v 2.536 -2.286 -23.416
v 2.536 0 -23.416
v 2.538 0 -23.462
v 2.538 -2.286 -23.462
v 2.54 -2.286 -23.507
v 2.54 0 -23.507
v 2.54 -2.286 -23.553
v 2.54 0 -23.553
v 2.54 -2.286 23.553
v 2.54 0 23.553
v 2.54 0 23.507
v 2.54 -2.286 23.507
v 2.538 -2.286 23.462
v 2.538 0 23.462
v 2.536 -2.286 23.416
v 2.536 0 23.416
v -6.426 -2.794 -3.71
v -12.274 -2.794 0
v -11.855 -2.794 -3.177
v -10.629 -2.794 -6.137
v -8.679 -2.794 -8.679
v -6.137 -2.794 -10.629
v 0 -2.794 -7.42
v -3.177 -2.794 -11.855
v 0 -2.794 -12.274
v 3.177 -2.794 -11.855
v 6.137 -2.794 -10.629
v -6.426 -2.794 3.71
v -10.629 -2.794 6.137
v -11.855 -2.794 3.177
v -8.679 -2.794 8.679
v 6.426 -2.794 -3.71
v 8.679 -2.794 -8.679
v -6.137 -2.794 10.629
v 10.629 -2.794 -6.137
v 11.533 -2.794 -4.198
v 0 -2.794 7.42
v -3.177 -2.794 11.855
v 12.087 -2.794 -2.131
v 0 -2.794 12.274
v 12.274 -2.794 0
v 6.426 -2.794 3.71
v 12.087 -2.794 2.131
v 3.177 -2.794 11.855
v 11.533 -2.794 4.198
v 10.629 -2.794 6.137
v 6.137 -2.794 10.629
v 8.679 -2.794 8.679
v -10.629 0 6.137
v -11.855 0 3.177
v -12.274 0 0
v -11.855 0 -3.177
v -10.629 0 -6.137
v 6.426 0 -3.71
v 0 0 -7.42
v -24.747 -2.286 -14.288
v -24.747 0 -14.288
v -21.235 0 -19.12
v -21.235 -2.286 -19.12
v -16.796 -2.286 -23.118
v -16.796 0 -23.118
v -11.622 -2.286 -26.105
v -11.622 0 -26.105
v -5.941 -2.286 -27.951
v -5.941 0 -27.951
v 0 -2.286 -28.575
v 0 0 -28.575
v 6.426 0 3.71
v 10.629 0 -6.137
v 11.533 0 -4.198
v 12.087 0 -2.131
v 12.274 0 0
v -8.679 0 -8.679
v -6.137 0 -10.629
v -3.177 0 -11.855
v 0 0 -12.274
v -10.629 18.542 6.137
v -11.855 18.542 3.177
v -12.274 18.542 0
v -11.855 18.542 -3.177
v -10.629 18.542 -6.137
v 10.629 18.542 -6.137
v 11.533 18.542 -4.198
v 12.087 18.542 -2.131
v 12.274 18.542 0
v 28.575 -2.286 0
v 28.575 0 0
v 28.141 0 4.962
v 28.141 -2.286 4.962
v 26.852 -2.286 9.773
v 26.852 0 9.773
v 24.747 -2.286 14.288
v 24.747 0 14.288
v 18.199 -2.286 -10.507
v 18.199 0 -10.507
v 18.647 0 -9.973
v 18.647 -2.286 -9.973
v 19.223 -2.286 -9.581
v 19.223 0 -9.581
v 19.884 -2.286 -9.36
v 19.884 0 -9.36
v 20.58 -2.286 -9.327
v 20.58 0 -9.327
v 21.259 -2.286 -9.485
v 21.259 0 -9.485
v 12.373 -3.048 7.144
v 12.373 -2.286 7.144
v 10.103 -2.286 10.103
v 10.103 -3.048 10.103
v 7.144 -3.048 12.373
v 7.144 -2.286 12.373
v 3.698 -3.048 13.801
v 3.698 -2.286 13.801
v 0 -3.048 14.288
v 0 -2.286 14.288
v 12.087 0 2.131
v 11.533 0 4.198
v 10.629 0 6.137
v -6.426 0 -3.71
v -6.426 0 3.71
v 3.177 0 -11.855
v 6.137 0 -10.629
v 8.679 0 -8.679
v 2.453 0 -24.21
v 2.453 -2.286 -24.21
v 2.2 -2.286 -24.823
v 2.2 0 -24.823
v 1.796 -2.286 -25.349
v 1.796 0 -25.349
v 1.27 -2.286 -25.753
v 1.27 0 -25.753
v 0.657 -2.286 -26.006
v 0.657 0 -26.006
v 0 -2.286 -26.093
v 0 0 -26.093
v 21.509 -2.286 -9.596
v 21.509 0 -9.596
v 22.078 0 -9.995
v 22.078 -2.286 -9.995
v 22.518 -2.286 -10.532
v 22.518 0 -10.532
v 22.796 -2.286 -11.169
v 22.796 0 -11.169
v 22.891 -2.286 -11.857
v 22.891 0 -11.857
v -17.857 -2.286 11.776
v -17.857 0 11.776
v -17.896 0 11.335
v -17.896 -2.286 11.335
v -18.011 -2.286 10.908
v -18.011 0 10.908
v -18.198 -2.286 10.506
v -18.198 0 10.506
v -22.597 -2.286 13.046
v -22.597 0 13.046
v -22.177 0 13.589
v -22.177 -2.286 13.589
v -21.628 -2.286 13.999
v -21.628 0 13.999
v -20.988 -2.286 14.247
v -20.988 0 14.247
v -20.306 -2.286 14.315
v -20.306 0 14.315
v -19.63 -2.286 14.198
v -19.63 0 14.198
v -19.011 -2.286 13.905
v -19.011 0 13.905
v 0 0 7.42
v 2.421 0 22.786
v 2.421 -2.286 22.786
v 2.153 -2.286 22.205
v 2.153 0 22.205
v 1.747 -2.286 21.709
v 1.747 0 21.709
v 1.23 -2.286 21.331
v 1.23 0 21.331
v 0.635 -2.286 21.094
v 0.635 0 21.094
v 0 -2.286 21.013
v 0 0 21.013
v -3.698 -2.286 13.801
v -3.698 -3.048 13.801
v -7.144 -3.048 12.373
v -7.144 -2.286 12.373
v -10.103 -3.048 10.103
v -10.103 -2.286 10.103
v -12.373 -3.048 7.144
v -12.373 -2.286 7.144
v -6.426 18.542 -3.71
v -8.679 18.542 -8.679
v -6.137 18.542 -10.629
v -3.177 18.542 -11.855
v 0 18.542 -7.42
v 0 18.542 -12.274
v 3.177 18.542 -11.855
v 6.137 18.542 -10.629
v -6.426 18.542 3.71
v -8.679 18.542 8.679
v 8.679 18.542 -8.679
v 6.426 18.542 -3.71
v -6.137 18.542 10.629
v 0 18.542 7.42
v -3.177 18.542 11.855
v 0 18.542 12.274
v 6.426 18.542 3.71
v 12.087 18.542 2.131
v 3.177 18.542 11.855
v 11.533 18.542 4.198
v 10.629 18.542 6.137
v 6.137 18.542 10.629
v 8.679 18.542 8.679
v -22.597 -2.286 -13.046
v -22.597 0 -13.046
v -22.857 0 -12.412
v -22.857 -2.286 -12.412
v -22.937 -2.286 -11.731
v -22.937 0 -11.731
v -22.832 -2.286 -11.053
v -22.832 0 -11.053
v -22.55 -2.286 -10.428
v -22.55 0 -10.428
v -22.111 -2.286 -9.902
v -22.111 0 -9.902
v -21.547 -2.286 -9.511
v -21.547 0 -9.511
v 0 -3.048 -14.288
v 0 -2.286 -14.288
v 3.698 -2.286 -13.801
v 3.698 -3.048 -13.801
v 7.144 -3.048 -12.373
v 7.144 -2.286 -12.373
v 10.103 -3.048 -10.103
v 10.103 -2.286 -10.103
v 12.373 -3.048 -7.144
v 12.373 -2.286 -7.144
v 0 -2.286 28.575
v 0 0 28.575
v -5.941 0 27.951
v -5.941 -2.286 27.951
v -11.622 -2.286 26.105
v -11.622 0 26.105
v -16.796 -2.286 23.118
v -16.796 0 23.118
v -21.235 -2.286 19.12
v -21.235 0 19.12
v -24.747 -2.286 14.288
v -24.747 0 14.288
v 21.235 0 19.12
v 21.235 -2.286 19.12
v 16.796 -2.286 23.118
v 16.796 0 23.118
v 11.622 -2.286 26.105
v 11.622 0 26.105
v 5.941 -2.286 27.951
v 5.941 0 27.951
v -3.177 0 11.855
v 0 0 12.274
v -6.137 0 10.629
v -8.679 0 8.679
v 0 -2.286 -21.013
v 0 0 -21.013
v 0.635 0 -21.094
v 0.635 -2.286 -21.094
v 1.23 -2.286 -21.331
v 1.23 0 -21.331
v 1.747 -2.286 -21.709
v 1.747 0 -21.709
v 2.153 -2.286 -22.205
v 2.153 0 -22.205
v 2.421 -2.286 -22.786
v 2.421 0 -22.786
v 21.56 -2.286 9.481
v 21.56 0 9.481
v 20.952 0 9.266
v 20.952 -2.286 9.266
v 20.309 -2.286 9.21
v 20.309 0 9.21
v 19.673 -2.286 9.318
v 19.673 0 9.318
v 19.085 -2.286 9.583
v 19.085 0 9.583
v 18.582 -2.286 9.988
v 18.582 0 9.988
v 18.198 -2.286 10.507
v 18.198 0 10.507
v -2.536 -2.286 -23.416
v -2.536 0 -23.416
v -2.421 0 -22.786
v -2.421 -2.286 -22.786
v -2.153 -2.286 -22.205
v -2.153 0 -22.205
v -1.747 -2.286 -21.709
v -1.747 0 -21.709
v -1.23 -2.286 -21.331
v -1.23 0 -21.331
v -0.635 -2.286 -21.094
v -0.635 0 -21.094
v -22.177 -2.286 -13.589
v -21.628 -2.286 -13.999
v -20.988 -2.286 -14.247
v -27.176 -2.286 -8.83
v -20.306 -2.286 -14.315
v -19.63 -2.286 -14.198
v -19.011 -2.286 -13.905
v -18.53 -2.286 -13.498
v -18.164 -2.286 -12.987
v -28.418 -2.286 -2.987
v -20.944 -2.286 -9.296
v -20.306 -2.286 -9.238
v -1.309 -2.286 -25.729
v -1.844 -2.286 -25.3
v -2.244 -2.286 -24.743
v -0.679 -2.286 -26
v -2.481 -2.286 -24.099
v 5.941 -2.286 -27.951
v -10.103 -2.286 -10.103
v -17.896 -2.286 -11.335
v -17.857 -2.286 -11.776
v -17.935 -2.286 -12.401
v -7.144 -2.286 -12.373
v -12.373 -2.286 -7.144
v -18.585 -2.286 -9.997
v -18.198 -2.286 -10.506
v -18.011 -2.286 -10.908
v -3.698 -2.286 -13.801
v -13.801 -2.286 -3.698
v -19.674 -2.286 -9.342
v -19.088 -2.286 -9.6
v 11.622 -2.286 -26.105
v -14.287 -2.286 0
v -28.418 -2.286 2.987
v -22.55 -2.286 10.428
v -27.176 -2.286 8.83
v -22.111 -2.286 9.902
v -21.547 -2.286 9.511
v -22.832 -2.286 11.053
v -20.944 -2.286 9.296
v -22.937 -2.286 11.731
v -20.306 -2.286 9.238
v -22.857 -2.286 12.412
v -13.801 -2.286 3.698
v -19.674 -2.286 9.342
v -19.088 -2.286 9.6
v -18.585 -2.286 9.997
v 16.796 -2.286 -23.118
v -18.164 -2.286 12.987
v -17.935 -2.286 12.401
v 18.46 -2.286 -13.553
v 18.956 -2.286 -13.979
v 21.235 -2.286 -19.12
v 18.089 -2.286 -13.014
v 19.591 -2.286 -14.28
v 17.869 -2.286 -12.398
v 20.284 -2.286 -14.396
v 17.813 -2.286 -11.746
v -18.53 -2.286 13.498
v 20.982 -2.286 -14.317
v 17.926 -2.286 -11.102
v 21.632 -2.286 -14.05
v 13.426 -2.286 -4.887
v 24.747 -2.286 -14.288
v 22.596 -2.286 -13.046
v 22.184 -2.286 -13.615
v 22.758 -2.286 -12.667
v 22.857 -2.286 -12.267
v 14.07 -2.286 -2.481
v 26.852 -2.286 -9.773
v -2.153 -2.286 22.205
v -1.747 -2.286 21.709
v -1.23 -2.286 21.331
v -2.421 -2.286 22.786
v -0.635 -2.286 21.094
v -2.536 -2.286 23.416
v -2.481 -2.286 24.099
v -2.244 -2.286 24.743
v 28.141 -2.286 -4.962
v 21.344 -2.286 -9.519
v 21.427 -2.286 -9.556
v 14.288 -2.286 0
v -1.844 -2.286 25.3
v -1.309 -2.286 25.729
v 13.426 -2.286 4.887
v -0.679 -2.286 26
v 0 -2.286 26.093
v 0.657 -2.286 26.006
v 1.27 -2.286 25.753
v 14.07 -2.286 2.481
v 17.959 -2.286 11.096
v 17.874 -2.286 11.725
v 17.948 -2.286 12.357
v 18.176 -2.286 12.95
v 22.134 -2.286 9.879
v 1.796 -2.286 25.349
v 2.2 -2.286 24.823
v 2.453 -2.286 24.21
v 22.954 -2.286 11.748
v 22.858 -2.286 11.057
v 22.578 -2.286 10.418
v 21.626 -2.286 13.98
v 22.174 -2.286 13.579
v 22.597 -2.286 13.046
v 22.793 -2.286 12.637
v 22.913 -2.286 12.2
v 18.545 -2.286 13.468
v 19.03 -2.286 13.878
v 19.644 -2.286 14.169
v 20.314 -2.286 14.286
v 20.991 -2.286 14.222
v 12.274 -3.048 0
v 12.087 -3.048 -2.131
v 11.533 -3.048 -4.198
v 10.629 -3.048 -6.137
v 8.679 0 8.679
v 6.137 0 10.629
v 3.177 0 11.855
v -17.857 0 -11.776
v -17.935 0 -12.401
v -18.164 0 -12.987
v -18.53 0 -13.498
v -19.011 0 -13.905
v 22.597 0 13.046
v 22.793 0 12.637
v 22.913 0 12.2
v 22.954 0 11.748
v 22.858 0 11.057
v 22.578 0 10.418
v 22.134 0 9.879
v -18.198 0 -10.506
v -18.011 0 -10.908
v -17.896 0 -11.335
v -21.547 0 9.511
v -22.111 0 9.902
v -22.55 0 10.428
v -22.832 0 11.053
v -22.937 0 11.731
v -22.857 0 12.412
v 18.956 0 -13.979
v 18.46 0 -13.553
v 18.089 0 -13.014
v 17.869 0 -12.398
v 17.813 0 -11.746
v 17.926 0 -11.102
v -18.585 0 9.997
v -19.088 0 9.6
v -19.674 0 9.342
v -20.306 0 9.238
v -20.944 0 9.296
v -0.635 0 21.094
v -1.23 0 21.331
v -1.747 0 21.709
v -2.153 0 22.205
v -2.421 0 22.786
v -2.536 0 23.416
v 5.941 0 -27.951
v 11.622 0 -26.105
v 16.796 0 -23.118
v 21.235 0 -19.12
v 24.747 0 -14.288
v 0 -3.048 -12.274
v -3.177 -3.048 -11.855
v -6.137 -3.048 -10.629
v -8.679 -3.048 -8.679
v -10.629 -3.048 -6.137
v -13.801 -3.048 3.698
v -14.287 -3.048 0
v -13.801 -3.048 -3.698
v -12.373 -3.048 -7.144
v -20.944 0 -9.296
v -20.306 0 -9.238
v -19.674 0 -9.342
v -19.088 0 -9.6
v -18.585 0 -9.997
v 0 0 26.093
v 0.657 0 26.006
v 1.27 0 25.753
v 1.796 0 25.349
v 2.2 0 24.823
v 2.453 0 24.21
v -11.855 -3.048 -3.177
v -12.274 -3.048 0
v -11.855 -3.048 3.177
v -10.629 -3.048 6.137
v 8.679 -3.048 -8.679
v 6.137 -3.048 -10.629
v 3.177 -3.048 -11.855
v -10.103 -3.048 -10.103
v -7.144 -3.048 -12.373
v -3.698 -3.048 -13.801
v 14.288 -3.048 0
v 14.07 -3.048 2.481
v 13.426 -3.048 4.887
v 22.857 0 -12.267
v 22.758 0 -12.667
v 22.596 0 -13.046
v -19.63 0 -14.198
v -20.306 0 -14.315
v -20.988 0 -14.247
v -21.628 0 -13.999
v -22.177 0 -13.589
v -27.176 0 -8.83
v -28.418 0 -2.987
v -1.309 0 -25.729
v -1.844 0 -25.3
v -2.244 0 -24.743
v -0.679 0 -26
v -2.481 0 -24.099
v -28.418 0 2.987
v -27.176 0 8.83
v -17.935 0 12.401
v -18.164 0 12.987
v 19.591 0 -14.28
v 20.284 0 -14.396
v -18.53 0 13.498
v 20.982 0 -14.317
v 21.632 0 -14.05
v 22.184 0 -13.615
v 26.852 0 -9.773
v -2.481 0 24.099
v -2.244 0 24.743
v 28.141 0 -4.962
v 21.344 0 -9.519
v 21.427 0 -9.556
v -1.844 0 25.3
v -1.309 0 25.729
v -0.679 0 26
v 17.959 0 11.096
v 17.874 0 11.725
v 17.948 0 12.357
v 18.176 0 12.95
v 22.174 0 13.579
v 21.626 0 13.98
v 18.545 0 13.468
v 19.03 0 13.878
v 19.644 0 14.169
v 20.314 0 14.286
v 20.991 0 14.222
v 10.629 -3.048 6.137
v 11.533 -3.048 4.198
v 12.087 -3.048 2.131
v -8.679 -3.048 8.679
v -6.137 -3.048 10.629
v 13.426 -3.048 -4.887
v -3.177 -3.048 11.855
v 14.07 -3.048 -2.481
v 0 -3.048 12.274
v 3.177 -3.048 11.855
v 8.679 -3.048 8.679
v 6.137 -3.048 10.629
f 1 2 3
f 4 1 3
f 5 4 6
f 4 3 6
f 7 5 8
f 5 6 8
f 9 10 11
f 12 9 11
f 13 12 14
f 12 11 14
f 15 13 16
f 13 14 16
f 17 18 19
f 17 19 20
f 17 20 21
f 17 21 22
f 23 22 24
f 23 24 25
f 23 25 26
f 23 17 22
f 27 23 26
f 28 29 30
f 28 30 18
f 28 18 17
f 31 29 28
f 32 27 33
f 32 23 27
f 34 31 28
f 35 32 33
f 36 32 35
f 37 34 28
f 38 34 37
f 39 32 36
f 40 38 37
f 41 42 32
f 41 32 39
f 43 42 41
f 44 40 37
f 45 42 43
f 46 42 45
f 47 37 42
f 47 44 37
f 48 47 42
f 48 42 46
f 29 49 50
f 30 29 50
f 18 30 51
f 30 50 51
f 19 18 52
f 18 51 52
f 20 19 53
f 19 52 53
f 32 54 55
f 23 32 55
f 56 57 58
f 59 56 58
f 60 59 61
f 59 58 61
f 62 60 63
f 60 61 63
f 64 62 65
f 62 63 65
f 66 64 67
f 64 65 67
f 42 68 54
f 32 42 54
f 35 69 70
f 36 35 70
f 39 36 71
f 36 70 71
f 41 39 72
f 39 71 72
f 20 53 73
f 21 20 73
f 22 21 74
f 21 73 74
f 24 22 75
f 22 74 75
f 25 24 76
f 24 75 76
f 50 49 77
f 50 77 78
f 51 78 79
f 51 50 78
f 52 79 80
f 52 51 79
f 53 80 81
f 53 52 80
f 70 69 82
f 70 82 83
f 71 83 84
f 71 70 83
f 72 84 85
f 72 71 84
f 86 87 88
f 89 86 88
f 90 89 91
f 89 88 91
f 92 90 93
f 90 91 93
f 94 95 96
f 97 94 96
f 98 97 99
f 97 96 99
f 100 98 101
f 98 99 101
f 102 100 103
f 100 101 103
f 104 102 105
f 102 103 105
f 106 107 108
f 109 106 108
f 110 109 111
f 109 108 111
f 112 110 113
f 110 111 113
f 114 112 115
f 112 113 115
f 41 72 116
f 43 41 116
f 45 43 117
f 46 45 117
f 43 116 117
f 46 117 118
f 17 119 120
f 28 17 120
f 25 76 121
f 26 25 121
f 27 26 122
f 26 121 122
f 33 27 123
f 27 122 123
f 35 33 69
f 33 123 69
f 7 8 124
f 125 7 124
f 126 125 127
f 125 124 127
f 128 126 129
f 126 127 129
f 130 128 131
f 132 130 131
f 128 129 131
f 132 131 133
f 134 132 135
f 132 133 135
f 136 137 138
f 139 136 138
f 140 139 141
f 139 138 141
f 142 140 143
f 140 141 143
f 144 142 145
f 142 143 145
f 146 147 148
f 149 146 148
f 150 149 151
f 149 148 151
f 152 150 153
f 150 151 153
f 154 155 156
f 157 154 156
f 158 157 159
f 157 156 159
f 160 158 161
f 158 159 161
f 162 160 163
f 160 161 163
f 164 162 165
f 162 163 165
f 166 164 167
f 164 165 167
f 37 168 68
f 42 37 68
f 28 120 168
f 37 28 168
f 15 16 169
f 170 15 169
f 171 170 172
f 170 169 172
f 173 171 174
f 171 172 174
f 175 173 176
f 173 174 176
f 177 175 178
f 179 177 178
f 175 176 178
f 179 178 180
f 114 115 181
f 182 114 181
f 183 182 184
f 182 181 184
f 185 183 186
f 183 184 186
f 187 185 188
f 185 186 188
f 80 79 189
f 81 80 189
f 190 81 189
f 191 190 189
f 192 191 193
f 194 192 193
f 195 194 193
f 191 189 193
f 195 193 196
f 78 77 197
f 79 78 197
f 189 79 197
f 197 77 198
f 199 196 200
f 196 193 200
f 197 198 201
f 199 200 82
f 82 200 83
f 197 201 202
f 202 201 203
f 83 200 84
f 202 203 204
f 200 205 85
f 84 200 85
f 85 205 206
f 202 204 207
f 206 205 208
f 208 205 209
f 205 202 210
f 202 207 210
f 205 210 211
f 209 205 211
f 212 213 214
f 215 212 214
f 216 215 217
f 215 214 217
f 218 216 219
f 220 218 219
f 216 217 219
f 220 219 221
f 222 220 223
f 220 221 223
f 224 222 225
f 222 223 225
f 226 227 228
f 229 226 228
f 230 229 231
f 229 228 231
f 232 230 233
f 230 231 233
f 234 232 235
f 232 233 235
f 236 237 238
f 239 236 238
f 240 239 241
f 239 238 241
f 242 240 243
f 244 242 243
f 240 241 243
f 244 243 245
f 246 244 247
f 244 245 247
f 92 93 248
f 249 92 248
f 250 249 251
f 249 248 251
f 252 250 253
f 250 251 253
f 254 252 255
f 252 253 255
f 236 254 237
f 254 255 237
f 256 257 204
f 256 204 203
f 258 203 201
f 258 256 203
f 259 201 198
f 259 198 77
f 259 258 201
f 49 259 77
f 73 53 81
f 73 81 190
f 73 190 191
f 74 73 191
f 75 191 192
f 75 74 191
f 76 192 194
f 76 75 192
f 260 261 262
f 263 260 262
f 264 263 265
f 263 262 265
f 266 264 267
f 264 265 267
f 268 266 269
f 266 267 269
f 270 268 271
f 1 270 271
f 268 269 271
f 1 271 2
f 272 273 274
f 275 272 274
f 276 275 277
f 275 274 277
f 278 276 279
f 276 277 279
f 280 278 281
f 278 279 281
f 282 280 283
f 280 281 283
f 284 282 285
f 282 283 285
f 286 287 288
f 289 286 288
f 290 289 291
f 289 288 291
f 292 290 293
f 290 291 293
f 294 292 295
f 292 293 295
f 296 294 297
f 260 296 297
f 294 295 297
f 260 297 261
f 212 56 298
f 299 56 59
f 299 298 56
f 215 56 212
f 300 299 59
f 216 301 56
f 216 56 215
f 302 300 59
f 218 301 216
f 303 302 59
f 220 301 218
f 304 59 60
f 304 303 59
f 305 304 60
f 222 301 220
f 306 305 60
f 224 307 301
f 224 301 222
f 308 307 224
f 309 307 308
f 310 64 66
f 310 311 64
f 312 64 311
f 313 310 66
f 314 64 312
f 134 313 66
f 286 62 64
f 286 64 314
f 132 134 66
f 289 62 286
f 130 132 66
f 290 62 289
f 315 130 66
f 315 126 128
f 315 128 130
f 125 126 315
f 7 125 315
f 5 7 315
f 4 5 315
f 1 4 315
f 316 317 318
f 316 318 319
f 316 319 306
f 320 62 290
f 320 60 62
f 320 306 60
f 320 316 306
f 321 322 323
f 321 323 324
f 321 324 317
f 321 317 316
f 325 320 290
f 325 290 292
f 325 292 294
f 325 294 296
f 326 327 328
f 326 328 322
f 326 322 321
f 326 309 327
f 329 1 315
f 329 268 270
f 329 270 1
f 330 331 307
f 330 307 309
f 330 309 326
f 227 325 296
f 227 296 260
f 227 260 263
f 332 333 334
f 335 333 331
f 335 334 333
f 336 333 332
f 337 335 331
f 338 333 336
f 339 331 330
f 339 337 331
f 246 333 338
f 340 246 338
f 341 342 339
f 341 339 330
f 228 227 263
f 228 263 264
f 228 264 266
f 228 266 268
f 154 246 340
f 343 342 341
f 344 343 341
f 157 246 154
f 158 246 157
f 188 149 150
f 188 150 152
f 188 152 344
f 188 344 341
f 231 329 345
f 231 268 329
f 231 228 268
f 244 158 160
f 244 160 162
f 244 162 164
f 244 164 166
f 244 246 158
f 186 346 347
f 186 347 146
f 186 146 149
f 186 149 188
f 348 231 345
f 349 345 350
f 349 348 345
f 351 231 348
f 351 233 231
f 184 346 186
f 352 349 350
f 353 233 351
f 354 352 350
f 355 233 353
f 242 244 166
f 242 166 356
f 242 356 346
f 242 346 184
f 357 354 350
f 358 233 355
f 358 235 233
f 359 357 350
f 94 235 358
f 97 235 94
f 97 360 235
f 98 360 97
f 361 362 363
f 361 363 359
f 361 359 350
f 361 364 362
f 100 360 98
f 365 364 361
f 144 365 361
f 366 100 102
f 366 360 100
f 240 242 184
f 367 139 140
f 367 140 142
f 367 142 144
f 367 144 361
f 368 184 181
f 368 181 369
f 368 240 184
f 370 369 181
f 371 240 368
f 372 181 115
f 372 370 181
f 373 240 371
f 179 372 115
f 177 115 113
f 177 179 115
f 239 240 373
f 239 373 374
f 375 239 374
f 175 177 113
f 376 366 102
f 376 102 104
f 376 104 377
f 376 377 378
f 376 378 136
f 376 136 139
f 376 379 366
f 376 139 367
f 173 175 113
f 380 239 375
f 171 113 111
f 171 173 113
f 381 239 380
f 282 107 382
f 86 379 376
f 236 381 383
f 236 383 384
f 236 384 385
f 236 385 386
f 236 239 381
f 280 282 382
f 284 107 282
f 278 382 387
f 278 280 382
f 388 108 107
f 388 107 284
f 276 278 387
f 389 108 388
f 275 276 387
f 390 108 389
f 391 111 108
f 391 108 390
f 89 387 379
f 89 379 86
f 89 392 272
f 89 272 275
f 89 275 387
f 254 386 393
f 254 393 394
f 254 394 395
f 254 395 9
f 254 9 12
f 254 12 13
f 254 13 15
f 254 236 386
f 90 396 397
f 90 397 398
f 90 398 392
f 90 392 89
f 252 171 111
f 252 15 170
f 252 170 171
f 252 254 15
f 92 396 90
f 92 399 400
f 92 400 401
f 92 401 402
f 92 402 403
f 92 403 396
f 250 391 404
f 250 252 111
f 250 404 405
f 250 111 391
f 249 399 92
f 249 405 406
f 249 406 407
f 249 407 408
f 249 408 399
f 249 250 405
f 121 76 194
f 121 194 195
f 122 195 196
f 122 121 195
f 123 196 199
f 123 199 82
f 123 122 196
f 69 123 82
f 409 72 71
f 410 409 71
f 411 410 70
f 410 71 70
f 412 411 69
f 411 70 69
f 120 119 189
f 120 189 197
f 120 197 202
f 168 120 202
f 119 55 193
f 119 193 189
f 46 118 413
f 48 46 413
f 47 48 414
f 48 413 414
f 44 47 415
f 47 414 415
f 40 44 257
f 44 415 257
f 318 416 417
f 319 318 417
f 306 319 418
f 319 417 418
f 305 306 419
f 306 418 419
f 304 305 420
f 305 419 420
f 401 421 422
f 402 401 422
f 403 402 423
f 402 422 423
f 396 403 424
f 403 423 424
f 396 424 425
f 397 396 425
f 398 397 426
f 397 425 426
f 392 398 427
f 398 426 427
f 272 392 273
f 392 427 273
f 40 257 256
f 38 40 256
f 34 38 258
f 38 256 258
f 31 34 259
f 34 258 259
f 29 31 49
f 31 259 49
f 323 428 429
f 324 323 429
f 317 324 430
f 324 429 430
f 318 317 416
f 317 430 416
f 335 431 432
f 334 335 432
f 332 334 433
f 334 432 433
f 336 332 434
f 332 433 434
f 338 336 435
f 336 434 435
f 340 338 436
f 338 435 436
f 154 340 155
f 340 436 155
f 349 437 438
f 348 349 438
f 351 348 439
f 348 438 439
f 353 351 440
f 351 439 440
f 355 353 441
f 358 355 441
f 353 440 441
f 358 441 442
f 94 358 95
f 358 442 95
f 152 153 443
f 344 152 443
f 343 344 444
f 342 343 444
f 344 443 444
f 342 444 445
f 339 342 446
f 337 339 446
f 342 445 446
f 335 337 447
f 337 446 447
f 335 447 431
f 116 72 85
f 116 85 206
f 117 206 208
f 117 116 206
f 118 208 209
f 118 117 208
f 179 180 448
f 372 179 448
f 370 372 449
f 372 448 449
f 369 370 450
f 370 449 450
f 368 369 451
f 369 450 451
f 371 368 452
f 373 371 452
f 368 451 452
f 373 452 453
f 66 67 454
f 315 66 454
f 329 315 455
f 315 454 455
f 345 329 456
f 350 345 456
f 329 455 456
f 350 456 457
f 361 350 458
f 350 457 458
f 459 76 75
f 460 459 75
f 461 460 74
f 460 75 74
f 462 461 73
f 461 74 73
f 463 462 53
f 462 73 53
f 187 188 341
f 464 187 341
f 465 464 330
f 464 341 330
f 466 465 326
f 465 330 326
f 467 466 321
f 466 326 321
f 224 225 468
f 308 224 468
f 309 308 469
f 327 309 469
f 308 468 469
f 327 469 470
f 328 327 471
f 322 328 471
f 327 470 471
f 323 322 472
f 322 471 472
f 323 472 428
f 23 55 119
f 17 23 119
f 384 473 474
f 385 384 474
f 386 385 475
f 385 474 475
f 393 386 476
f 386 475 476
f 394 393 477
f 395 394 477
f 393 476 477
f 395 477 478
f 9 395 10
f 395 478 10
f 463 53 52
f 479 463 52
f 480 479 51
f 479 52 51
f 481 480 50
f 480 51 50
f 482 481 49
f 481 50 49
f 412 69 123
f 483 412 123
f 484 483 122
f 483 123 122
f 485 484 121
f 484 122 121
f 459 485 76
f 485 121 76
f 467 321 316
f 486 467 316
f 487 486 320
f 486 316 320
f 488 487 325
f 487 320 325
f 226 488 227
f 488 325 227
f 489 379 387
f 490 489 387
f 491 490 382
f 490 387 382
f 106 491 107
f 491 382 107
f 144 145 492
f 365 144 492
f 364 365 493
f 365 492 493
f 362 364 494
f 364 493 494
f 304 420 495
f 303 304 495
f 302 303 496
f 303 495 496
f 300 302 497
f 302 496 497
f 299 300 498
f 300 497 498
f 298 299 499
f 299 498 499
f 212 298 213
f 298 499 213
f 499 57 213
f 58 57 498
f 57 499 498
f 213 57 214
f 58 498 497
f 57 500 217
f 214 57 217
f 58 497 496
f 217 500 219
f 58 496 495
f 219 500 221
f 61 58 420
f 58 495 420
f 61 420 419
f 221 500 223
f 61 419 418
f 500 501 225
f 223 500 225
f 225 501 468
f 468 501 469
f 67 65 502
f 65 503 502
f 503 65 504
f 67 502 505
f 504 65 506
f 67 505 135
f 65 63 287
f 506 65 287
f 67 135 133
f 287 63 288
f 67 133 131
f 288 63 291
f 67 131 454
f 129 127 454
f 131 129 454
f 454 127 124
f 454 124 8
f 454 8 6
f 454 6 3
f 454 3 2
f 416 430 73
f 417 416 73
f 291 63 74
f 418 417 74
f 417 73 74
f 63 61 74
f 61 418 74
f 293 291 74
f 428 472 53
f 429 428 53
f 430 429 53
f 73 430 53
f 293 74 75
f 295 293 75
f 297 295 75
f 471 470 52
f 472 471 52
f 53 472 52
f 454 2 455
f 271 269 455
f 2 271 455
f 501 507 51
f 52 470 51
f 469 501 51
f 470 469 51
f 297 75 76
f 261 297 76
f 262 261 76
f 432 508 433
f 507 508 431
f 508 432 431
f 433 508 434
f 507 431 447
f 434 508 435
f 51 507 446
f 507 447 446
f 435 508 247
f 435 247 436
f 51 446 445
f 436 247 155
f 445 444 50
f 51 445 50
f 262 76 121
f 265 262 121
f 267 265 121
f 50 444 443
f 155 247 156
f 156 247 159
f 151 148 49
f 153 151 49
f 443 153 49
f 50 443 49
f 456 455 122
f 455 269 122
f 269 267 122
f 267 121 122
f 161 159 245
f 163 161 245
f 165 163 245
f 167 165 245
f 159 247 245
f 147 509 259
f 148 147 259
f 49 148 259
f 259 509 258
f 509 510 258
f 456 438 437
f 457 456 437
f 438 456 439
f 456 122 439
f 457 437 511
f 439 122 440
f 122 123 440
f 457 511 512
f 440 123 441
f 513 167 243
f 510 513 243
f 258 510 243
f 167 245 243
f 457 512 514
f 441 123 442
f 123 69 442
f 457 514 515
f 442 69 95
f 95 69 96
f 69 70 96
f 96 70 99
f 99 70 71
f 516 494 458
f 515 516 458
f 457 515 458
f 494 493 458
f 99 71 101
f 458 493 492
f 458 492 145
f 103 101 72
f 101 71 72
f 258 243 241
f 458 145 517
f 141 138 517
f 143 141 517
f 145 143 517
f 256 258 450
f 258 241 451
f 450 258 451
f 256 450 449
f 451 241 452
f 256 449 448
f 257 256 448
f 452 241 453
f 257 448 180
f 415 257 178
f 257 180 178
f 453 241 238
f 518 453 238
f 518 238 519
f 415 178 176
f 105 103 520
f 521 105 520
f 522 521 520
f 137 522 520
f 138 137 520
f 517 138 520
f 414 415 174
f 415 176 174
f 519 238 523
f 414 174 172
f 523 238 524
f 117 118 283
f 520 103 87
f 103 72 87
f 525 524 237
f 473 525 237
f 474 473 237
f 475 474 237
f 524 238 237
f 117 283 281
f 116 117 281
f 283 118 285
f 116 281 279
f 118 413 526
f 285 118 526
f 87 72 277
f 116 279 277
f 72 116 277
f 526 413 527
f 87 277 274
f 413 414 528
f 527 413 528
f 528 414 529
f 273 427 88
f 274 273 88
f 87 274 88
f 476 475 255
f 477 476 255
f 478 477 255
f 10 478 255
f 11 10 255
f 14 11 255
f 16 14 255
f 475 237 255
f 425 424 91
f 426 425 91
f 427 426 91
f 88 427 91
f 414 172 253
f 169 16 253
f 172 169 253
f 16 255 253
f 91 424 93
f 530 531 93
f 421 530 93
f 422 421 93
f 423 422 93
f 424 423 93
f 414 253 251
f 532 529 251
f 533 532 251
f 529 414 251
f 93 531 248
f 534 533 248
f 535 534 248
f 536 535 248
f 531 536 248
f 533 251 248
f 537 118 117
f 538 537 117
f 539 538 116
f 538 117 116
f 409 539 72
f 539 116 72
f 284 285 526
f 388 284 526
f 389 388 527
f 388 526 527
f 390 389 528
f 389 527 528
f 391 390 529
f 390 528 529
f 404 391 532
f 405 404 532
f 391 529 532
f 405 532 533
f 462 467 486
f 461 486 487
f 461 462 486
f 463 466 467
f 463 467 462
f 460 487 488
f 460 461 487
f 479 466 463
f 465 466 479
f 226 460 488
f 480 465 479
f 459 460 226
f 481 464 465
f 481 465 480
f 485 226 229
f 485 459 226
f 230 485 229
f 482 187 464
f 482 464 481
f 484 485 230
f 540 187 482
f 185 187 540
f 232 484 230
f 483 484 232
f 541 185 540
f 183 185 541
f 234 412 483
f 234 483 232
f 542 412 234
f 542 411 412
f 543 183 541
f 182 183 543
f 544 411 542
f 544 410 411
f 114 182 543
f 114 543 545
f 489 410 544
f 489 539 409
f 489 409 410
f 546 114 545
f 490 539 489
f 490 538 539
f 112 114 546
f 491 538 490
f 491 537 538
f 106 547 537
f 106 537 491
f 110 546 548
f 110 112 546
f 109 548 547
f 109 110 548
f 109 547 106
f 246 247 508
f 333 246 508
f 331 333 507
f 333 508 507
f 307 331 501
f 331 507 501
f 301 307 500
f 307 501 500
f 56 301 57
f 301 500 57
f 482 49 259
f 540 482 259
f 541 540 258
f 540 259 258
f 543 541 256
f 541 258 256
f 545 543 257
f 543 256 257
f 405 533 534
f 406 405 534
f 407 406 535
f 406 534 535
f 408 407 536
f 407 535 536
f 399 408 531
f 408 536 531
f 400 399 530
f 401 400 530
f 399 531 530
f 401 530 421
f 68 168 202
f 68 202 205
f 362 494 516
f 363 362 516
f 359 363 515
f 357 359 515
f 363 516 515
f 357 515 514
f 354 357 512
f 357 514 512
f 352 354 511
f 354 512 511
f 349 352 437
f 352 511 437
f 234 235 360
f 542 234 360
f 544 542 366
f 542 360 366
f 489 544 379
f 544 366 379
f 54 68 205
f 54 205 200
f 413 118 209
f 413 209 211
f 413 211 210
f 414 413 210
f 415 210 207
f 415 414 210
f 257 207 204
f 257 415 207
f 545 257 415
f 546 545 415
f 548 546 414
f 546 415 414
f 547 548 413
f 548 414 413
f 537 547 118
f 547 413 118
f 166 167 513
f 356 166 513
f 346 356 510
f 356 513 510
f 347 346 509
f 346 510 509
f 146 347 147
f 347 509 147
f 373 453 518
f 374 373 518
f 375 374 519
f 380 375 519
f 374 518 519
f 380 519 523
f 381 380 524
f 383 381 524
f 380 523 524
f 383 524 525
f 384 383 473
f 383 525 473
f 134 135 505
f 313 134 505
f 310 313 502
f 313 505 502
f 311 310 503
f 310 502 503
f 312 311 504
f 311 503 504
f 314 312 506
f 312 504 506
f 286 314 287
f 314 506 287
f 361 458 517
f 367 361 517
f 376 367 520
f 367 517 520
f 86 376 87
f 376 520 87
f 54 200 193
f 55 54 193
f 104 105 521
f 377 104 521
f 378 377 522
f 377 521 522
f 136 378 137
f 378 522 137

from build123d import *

# Parameters (mm, degrees)
F1_DEPTH = 18.542
F2_DEPTH = 3.048
F3_DEPTH = 2.286
F4_DEPTH = 2.286
F6_DEPTH = 2.794


# Not quite as in the source:
# - a feature of the source that left no trace in its solid (it failed there, or was rolled back) is left out


with BuildPart() as f1:
    # F0 (on Front) → F1 (new body)
    with BuildSketch(Plane.XZ):
        with BuildLine():
            Line((6.4262, 3.7101682999), (10.6292995539, 6.1368289587))
            ThreePointArc((10.6292995539, 6.1368289587), (6.1368289587, 10.6292995539), (0, 12.2736579174))
            Line((0, 12.2736579174), (0, 7.4203365997))
            Line((0, 7.4203365997), (6.4262, 3.7101682999))
        make_face()
        with BuildLine():
            ThreePointArc((12.2736579174, 0), (11.8554431655, 3.1766564221), (10.6292995539, 6.1368289587))
            Line((10.6292995539, 6.1368289587), (6.4262, 3.7101682999))
            Line((6.4262, 3.7101682999), (6.4262, -2.8670745859))
            Line((6.4262, -2.8670745859), (6.4262, -3.7101682999))
            Line((6.4262, -3.7101682999), (10.6292995539, -6.1368289587))
            ThreePointArc((10.6292995539, -6.1368289587), (11.8554431655, -3.1766564221), (12.2736579174, 0))
        make_face()
        with BuildLine():
            ThreePointArc((0, -12.2736579174), (6.1368289587, -10.6292995539), (10.6292995539, -6.1368289587))
            Line((10.6292995539, -6.1368289587), (6.4262, -3.7101682999))
            Line((6.4262, -3.7101682999), (0, -7.4203365997))
            Line((0, -7.4203365997), (0, -12.2736579174))
        make_face()
        with BuildLine():
            Line((0, 7.4203365997), (0, 12.2736579174))
            ThreePointArc((0, 12.2736579174), (-6.1368289587, 10.6292995539), (-10.6292995539, 6.1368289587))
            Line((-10.6292995539, 6.1368289587), (-6.4262, 3.7101682999))
            Line((-6.4262, 3.7101682999), (0, 7.4203365997))
        make_face()
        with BuildLine():
            ThreePointArc((-10.6292995539, -6.1368289587), (-6.1368289587, -10.6292995539), (0, -12.2736579174))
            Line((0, -12.2736579174), (0, -7.4203365997))
            Line((0, -7.4203365997), (-6.4262, -3.7101682999))
            Line((-6.4262, -3.7101682999), (-10.6292995539, -6.1368289587))
        make_face()
        with BuildLine():
            Line((-6.4262, 3.7101682999), (-10.6292995539, 6.1368289587))
            ThreePointArc((-10.6292995539, 6.1368289587), (-12.2736579174, 0), (-10.6292995539, -6.1368289587))
            Line((-10.6292995539, -6.1368289587), (-6.4262, -3.7101682999))
            Line((-6.4262, -3.7101682999), (-6.4262, 3.7101682999))
        make_face()
    extrude(amount=-F1_DEPTH)

    # F0 (on Front) → F6 (join)
    with BuildSketch(Plane.XZ):
        with BuildLine():
            Line((6.4262, 3.7101682999), (10.6292995539, 6.1368289587))
            ThreePointArc((10.6292995539, 6.1368289587), (6.1368289587, 10.6292995539), (0, 12.2736579174))
            Line((0, 12.2736579174), (0, 7.4203365997))
            Line((0, 7.4203365997), (6.4262, 3.7101682999))
        make_face()
        with BuildLine():
            ThreePointArc((12.2736579174, 0), (11.8554431655, 3.1766564221), (10.6292995539, 6.1368289587))
            Line((10.6292995539, 6.1368289587), (6.4262, 3.7101682999))
            Line((6.4262, 3.7101682999), (6.4262, -2.8670745859))
            Line((6.4262, -2.8670745859), (6.4262, -3.7101682999))
            Line((6.4262, -3.7101682999), (10.6292995539, -6.1368289587))
            ThreePointArc((10.6292995539, -6.1368289587), (11.8554431655, -3.1766564221), (12.2736579174, 0))
        make_face()
        with BuildLine():
            ThreePointArc((0, -12.2736579174), (6.1368289587, -10.6292995539), (10.6292995539, -6.1368289587))
            Line((10.6292995539, -6.1368289587), (6.4262, -3.7101682999))
            Line((6.4262, -3.7101682999), (0, -7.4203365997))
            Line((0, -7.4203365997), (0, -12.2736579174))
        make_face()
        with BuildLine():
            Line((0, 7.4203365997), (0, 12.2736579174))
            ThreePointArc((0, 12.2736579174), (-6.1368289587, 10.6292995539), (-10.6292995539, 6.1368289587))
            Line((-10.6292995539, 6.1368289587), (-6.4262, 3.7101682999))
            Line((-6.4262, 3.7101682999), (0, 7.4203365997))
        make_face()
        with BuildLine():
            ThreePointArc((-10.6292995539, -6.1368289587), (-6.1368289587, -10.6292995539), (0, -12.2736579174))
            Line((0, -12.2736579174), (0, -7.4203365997))
            Line((0, -7.4203365997), (-6.4262, -3.7101682999))
            Line((-6.4262, -3.7101682999), (-10.6292995539, -6.1368289587))
        make_face()
        with BuildLine():
            Line((-6.4262, 3.7101682999), (-10.6292995539, 6.1368289587))
            ThreePointArc((-10.6292995539, 6.1368289587), (-12.2736579174, 0), (-10.6292995539, -6.1368289587))
            Line((-10.6292995539, -6.1368289587), (-6.4262, -3.7101682999))
            Line((-6.4262, -3.7101682999), (-6.4262, 3.7101682999))
        make_face()
    extrude(amount=F6_DEPTH)


with BuildPart() as f2:
    # F0 (on Front) → F2 (new body)
    with BuildSketch(Plane.XZ):
        with BuildLine():
            ThreePointArc((0, -14.2875), (7.14375, -12.3733379566), (12.3733379566, -7.14375))
            Line((12.3733379566, -7.14375), (10.6292995539, -6.1368289587))
            ThreePointArc((10.6292995539, -6.1368289587), (6.1368289587, -10.6292995539), (0, -12.2736579174))
            Line((0, -12.2736579174), (0, -14.2875))
        make_face()
        with BuildLine():
            ThreePointArc((-12.3733379566, -7.14375), (-7.14375, -12.3733379566), (0, -14.2875))
            Line((0, -14.2875), (0, -12.2736579174))
            ThreePointArc((0, -12.2736579174), (-6.1368289587, -10.6292995539), (-10.6292995539, -6.1368289587))
            Line((-10.6292995539, -6.1368289587), (-12.3733379566, -7.14375))
        make_face()
        with BuildLine():
            Line((-10.6292995539, 6.1368289587), (-12.3733379566, 7.14375))
            ThreePointArc((-12.3733379566, 7.14375), (-14.2875, 0), (-12.3733379566, -7.14375))
            Line((-12.3733379566, -7.14375), (-10.6292995539, -6.1368289587))
            ThreePointArc((-10.6292995539, -6.1368289587), (-12.2736579174, 0), (-10.6292995539, 6.1368289587))
        make_face()
        with BuildLine():
            Line((0, 12.2736579174), (0, 14.2875))
            ThreePointArc((0, 14.2875), (-7.14375, 12.3733379566), (-12.3733379566, 7.14375))
            Line((-12.3733379566, 7.14375), (-10.6292995539, 6.1368289587))
            ThreePointArc((-10.6292995539, 6.1368289587), (-6.1368289587, 10.6292995539), (0, 12.2736579174))
        make_face()
        with BuildLine():
            Line((10.6292995539, 6.1368289587), (12.3733379566, 7.14375))
            ThreePointArc((12.3733379566, 7.14375), (7.14375, 12.3733379566), (0, 14.2875))
            Line((0, 14.2875), (0, 12.2736579174))
            ThreePointArc((0, 12.2736579174), (6.1368289587, 10.6292995539), (10.6292995539, 6.1368289587))
        make_face()
        with BuildLine():
            ThreePointArc((14.2875, 0), (13.8006652431, 3.6978771069), (12.3733379566, 7.14375))
            Line((12.3733379566, 7.14375), (10.6292995539, 6.1368289587))
            ThreePointArc((10.6292995539, 6.1368289587), (11.8554431655, 3.1766564221), (12.2736579174, 0))
            ThreePointArc((12.2736579174, 0), (11.8554431655, -3.1766564221), (10.6292995539, -6.1368289587))
            Line((10.6292995539, -6.1368289587), (12.3733379566, -7.14375))
            ThreePointArc((12.3733379566, -7.14375), (13.8006652431, -3.6978771069), (14.2875, 0))
        make_face()
    extrude(amount=F2_DEPTH)

    # F0 (on Front) → F3 (join)
    with BuildSketch(Plane.XZ):
        with BuildLine():
            ThreePointArc((2.5363048132, -23.415995125), (11.7362040327, -20.4206558343), (18.9556707318, -13.9794211936))
            ThreePointArc((18.9556707318, -13.9794211936), (17.8690577157, -12.3976727234), (18.1990671233, -10.5072363026))
            Line((18.1990671233, -10.5072363026), (12.3733379566, -7.14375))
            ThreePointArc((12.3733379566, -7.14375), (7.14375, -12.3733379566), (0, -14.2875))
            Line((0, -14.2875), (0, -21.0129545875))
            ThreePointArc((0, -21.0129545875), (1.7469577793, -21.7091166019), (2.5363048132, -23.415995125))
        make_face()
        with BuildLine():
            ThreePointArc((-19.0106942266, -13.9045019625), (-11.7764772938, -20.397457007), (-2.5363048132, -23.415995125))
            ThreePointArc((-2.5363048132, -23.415995125), (-1.7469577793, -21.7091166019), (0, -21.0129545875))
            Line((0, -21.0129545875), (0, -14.2875))
            ThreePointArc((0, -14.2875), (-7.14375, -12.3733379566), (-12.3733379566, -7.14375))
            Line((-12.3733379566, -7.14375), (-18.1977524814, -10.5064772938))
            ThreePointArc((-18.1977524814, -10.5064772938), (-17.9440054082, -11.1190769192), (-17.857457007, -11.7764772938))
            ThreePointArc((-17.857457007, -11.7764772938), (-18.1643003329, -12.9866885434), (-19.0106942266, -13.9045019625))
        make_face()
        with BuildLine():
            ThreePointArc((-18.1977524814, 10.5064772938), (-19.6741253606, 9.3416484847), (-21.5469990398, 9.5114931625))
            ThreePointArc((-21.5469990398, 9.5114931625), (-23.5529545875, 0), (-21.5469990398, -9.5114931625))
            ThreePointArc((-21.5469990398, -9.5114931625), (-19.6741253606, -9.3416484847), (-18.1977524814, -10.5064772938))
            Line((-18.1977524814, -10.5064772938), (-12.3733379566, -7.14375))
            ThreePointArc((-12.3733379566, -7.14375), (-14.2875, 0), (-12.3733379566, 7.14375))
            Line((-12.3733379566, 7.14375), (-18.1977524814, 10.5064772938))
        make_face()
        with BuildLine():
            ThreePointArc((0, 21.0129545875), (-1.7469577793, 21.7091166019), (-2.5363048132, 23.415995125))
            ThreePointArc((-2.5363048132, 23.415995125), (-11.7764772938, 20.397457007), (-19.0106942266, 13.9045019625))
            ThreePointArc((-19.0106942266, 13.9045019625), (-18.1643003329, 12.9866885434), (-17.857457007, 11.7764772938))
            ThreePointArc((-17.857457007, 11.7764772938), (-17.9440054082, 11.1190769192), (-18.1977524814, 10.5064772938))
            Line((-18.1977524814, 10.5064772938), (-12.3733379566, 7.14375))
            ThreePointArc((-12.3733379566, 7.14375), (-7.14375, 12.3733379566), (0, 14.2875))
            Line((0, 14.2875), (0, 21.0129545875))
        make_face()
        with BuildLine():
            ThreePointArc((18.1979169714, 10.5065722621), (17.9478924637, 12.356678067), (19.0300897095, 13.8779449289))
            ThreePointArc((19.0300897095, 13.8779449289), (11.790714294, 20.3892306436), (2.5363048132, 23.415995125))
            ThreePointArc((2.5363048132, 23.415995125), (1.7469577793, 21.7091166019), (0, 21.0129545875))
            Line((0, 21.0129545875), (0, 14.2875))
            ThreePointArc((0, 14.2875), (7.14375, 12.3733379566), (12.3733379566, 7.14375))
            Line((12.3733379566, 7.14375), (18.1979169714, 10.5065722621))
        make_face()
        with BuildLine():
            ThreePointArc((23.5529545875, 0), (23.0493975606, 4.8442689742), (21.5602583585, 9.4813991223))
            ThreePointArc((21.5602583585, 9.4813991223), (19.6731048169, 9.3184074624), (18.1979169714, 10.5065722621))
            Line((18.1979169714, 10.5065722621), (12.3733379566, 7.14375))
            ThreePointArc((12.3733379566, 7.14375), (13.8006652431, 3.6978771069), (14.2875, 0))
            ThreePointArc((14.2875, 0), (13.8006652431, -3.6978771069), (12.3733379566, -7.14375))
            Line((12.3733379566, -7.14375), (18.1990671233, -10.5072363026))
            ThreePointArc((18.1990671233, -10.5072363026), (19.5459299692, -9.4477887138), (21.2591419094, -9.484850376))
            ThreePointArc((21.2591419094, -9.484850376), (21.3857231383, -9.5372788153), (21.5092932207, -9.5964563744))
            ThreePointArc((21.5092932207, -9.5964563744), (23.0363742399, -4.9058262996), (23.5529545875, 0))
        make_face()
    extrude(amount=F3_DEPTH)

    # F0 (on Front) → F4 (join)
    with BuildSketch(Plane.XZ):
        with BuildLine():
            Line((22.596957278, 13.0463593673), (24.7466759131, 14.2875))
            ThreePointArc((24.7466759131, 14.2875), (14.2875, 24.7466759131), (0, 28.575))
            Line((0, 28.575), (0, 26.0929545875))
            ThreePointArc((0, 26.0929545875), (1.7960512242, 25.3490058117), (2.54, 23.5529545875))
            ThreePointArc((2.54, 23.5529545875), (2.5390760353, 23.4844499366), (2.5363048132, 23.415995125))
            ThreePointArc((2.5363048132, 23.415995125), (11.790714294, 20.3892306436), (19.0300897095, 13.8779449289))
            ThreePointArc((19.0300897095, 13.8779449289), (20.9905935558, 14.2216476119), (22.596957278, 13.0463593673))
        make_face()
        with BuildLine():
            Line((0, 26.0929545875), (0, 28.575))
            ThreePointArc((0, 28.575), (-14.2875, 24.7466759131), (-24.7466759131, 14.2875))
            Line((-24.7466759131, 14.2875), (-22.5971615326, 13.0464772938))
            ThreePointArc((-22.5971615326, 13.0464772938), (-20.9884478303, 14.2467667194), (-19.0106942266, 13.9045019625))
            ThreePointArc((-19.0106942266, 13.9045019625), (-11.7764772938, 20.397457007), (-2.5363048132, 23.415995125))
            ThreePointArc((-2.5363048132, 23.415995125), (-1.8438379857, 25.2999123668), (0, 26.0929545875))
        make_face()
        with BuildLine():
            Line((-22.5971615326, 13.0464772938), (-24.7466759131, 14.2875))
            ThreePointArc((-24.7466759131, 14.2875), (-28.575, 0), (-24.7466759131, -14.2875))
            Line((-24.7466759131, -14.2875), (-22.5971615326, -13.0464772938))
            ThreePointArc((-22.5971615326, -13.0464772938), (-22.832285816, -11.0531456474), (-21.5469990398, -9.5114931625))
            ThreePointArc((-21.5469990398, -9.5114931625), (-23.5529545875, 0), (-21.5469990398, 9.5114931625))
            ThreePointArc((-21.5469990398, 9.5114931625), (-22.832285816, 11.0531456474), (-22.5971615326, 13.0464772938))
        make_face()
        with BuildLine():
            ThreePointArc((-24.7466759131, -14.2875), (-14.2875, -24.7466759131), (0, -28.575))
            Line((0, -28.575), (0, -26.0929545875))
            ThreePointArc((0, -26.0929545875), (-1.8438379857, -25.2999123668), (-2.5363048132, -23.415995125))
            ThreePointArc((-2.5363048132, -23.415995125), (-11.7764772938, -20.397457007), (-19.0106942266, -13.9045019625))
            ThreePointArc((-19.0106942266, -13.9045019625), (-20.9884478303, -14.2467667194), (-22.5971615326, -13.0464772938))
            Line((-22.5971615326, -13.0464772938), (-24.7466759131, -14.2875))
        make_face()
        with BuildLine():
            ThreePointArc((0, -28.575), (14.2875, -24.7466759131), (24.7466759131, -14.2875))
            Line((24.7466759131, -14.2875), (22.5955291864, -13.0455348583))
            ThreePointArc((22.5955291864, -13.0455348583), (20.9820683001, -14.3171964463), (18.9556707318, -13.9794211936))
            ThreePointArc((18.9556707318, -13.9794211936), (11.7362040327, -20.4206558343), (2.5363048132, -23.415995125))
            ThreePointArc((2.5363048132, -23.415995125), (2.5390760353, -23.4844499366), (2.54, -23.5529545875))
            ThreePointArc((2.54, -23.5529545875), (1.7960512242, -25.3490058117), (0, -26.0929545875))
            Line((0, -26.0929545875), (0, -28.575))
        make_face()
        with BuildLine():
            ThreePointArc((24.7466759131, -14.2875), (27.6013304862, -7.3957542138), (28.575, 0))
            ThreePointArc((28.575, 0), (27.6013304862, 7.3957542138), (24.7466759131, 14.2875))
            Line((24.7466759131, 14.2875), (22.596957278, 13.0463593673))
            ThreePointArc((22.596957278, 13.0463593673), (22.8630243002, 12.4212555209), (22.9538799063, 11.7479860816))
            ThreePointArc((22.9538799063, 11.7479860816), (22.5776036951, 10.4176104333), (21.5602583585, 9.4813991223))
            ThreePointArc((21.5602583585, 9.4813991223), (23.0493975606, 4.8442689742), (23.5529545875, 0))
            ThreePointArc((23.5529545875, 0), (23.0363742399, -4.9058262996), (21.5092932207, -9.5964563744))
            ThreePointArc((21.5092932207, -9.5964563744), (22.5180912242, -10.5322954019), (22.8908211645, -11.8568860891))
            ThreePointArc((22.8908211645, -11.8568860891), (22.8158930069, -12.4692755176), (22.5955291864, -13.0455348583))
            Line((22.5955291864, -13.0455348583), (24.7466759131, -14.2875))
        make_face()
    extrude(amount=F4_DEPTH)


solid = Compound([f1.part, f2.part])
